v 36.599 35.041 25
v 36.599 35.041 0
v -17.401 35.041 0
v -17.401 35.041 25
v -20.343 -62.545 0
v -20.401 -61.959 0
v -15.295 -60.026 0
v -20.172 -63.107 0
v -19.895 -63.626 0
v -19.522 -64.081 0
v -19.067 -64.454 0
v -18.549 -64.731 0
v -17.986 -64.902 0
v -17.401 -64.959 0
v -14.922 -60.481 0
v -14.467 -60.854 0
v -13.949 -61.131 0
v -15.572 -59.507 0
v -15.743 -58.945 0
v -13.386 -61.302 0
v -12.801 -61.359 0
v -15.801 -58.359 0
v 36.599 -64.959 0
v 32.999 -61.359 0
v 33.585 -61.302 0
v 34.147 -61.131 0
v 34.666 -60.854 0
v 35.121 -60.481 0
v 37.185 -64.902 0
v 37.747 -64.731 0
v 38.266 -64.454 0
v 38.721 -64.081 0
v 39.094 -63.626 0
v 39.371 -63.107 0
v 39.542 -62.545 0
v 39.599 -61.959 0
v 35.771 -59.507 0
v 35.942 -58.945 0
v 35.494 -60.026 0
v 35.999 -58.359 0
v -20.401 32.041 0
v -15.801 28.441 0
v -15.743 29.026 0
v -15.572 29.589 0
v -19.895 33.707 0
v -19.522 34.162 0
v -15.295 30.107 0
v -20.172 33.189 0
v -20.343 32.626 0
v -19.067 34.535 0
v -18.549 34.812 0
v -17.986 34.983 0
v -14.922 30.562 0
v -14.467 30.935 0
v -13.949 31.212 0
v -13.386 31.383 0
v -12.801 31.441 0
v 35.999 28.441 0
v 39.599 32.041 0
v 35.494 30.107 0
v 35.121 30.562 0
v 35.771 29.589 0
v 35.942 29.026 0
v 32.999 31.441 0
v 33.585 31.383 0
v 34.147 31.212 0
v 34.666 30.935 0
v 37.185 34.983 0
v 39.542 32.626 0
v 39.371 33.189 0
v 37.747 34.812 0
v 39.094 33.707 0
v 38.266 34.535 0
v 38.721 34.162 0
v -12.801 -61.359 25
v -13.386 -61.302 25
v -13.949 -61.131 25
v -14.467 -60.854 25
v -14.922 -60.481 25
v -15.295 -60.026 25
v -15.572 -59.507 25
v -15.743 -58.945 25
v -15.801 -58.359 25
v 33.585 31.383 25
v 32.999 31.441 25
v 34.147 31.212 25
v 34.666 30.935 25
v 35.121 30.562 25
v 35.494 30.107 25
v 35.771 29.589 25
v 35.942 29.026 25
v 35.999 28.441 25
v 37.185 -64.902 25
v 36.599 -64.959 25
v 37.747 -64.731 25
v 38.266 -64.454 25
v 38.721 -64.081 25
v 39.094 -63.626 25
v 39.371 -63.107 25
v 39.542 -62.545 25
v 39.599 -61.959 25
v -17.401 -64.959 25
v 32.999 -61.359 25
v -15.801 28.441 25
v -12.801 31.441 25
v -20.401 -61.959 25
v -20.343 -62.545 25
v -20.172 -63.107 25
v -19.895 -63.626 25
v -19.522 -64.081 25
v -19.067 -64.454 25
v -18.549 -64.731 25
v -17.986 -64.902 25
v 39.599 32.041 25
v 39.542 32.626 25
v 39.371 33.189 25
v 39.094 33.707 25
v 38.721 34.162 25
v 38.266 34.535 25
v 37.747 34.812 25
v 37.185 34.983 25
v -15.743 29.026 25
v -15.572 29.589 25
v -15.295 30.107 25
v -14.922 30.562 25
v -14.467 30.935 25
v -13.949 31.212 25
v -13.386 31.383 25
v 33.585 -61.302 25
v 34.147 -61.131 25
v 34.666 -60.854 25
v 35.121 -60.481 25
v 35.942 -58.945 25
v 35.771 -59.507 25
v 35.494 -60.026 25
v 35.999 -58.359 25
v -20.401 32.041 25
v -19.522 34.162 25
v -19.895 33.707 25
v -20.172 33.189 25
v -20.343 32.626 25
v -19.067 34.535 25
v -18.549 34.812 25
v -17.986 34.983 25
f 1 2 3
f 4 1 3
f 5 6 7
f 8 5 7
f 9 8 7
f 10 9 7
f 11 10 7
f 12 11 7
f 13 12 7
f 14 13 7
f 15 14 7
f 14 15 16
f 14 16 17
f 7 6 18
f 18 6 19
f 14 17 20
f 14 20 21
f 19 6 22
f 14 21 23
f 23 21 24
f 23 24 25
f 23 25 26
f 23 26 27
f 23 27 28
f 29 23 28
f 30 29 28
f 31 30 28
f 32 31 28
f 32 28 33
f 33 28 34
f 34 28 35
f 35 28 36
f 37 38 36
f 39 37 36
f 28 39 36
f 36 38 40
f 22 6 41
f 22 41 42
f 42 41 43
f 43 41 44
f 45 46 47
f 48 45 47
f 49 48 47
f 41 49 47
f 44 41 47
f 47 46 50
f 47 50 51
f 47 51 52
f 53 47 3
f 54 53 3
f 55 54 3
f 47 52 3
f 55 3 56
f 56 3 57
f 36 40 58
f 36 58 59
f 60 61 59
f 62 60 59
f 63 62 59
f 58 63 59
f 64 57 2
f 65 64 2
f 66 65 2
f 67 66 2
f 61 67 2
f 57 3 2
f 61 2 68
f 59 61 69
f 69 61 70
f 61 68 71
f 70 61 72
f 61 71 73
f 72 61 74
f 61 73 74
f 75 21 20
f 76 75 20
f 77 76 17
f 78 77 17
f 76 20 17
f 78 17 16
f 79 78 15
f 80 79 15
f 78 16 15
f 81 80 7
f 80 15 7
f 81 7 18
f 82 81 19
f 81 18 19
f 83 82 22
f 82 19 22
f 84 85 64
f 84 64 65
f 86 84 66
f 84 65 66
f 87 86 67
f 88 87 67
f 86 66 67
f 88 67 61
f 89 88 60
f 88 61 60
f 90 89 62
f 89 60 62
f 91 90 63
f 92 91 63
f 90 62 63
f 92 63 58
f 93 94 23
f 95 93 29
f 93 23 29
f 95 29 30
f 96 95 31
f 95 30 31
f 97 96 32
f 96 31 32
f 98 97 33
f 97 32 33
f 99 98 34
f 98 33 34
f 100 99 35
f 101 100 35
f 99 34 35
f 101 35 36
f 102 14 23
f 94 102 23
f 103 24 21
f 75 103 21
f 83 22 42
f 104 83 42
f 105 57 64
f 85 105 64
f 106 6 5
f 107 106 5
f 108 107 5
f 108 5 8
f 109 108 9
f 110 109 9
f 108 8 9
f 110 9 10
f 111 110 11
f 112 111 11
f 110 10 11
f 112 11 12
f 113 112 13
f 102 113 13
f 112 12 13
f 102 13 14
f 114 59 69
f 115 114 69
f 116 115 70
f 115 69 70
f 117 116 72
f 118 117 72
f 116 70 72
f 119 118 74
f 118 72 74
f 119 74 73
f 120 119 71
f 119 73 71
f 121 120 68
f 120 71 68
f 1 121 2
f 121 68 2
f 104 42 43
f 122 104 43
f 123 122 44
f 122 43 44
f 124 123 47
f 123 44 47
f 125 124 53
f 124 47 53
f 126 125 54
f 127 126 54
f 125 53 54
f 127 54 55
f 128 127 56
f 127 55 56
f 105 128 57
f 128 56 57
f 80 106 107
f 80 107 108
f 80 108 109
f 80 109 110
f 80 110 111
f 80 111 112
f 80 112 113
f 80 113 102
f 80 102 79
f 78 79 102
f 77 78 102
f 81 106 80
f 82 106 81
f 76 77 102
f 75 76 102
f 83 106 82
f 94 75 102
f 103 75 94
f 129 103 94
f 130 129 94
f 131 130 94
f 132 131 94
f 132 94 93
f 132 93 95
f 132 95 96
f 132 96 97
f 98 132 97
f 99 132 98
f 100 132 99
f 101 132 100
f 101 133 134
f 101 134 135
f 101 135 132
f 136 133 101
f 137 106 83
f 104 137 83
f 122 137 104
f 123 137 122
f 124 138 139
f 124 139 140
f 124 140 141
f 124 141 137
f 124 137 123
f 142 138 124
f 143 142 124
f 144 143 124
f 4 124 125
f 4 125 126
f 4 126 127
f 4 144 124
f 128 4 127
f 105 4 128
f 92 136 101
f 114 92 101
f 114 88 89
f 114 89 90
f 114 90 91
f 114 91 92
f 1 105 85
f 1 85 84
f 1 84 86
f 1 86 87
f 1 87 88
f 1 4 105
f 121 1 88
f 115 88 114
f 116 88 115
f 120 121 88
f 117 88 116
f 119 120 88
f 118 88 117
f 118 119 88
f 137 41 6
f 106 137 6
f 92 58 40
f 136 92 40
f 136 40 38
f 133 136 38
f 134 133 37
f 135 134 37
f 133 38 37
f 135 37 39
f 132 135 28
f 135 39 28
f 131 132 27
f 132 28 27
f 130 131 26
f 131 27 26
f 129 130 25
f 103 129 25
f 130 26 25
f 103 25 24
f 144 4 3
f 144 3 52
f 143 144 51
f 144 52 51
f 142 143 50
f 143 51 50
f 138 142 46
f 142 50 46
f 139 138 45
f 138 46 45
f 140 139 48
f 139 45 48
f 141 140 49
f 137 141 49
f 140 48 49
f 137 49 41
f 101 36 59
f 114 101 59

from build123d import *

# Parameters (mm, degrees)
F1_DEPTH = 25


with BuildPart() as f1:
    # F0 (on Top) → F1 (new body)
    with BuildSketch(Plane.XY):
        with BuildLine():
            Line((39.599326, -61.959296), (39.599326, 32.040704))
            ThreePointArc((39.599326, 32.040704), (38.720646, 34.162024), (36.599326, 35.040704))
            Line((36.599326, 35.040704), (-17.400674, 35.040704))
            ThreePointArc((-17.400674, 35.040704), (-19.521995, 34.162024), (-20.400674, 32.040704))
            Line((-20.400674, 32.040704), (-20.400674, -61.959296))
            ThreePointArc((-20.400674, -61.959296), (-19.521995, -64.080617), (-17.400674, -64.959296))
            Line((-17.400674, -64.959296), (9.599326, -64.959296))
            Line((9.599326, -64.959296), (36.599326, -64.959296))
            ThreePointArc((36.599326, -64.959296), (38.720646, -64.080617), (39.599326, -61.959296))
        make_face()
        with BuildLine():
            Line((32.999326, -61.359296), (10.599326, -61.359296))
            Line((10.599326, -61.359296), (-12.800674, -61.359296))
            ThreePointArc((-12.800674, -61.359296), (-14.921995, -60.480617), (-15.800674, -58.359296))
            Line((-15.800674, -58.359296), (-15.800674, 28.440704))
            ThreePointArc((-15.800674, 28.440704), (-14.921995, 30.562024), (-12.800674, 31.440704))
            Line((-12.800674, 31.440704), (9.599326, 31.440704))
            Line((9.599326, 31.440704), (10.599326, 31.440704))
            Line((10.599326, 31.440704), (32.999326, 31.440704))
            ThreePointArc((32.999326, 31.440704), (35.120646, 30.562024), (35.999326, 28.440704))
            Line((35.999326, 28.440704), (35.999326, -58.359296))
            ThreePointArc((35.999326, -58.359296), (35.120646, -60.480617), (32.999326, -61.359296))
        make_face(mode=Mode.SUBTRACT)
    extrude(amount=F1_DEPTH)


solid = f1.part
